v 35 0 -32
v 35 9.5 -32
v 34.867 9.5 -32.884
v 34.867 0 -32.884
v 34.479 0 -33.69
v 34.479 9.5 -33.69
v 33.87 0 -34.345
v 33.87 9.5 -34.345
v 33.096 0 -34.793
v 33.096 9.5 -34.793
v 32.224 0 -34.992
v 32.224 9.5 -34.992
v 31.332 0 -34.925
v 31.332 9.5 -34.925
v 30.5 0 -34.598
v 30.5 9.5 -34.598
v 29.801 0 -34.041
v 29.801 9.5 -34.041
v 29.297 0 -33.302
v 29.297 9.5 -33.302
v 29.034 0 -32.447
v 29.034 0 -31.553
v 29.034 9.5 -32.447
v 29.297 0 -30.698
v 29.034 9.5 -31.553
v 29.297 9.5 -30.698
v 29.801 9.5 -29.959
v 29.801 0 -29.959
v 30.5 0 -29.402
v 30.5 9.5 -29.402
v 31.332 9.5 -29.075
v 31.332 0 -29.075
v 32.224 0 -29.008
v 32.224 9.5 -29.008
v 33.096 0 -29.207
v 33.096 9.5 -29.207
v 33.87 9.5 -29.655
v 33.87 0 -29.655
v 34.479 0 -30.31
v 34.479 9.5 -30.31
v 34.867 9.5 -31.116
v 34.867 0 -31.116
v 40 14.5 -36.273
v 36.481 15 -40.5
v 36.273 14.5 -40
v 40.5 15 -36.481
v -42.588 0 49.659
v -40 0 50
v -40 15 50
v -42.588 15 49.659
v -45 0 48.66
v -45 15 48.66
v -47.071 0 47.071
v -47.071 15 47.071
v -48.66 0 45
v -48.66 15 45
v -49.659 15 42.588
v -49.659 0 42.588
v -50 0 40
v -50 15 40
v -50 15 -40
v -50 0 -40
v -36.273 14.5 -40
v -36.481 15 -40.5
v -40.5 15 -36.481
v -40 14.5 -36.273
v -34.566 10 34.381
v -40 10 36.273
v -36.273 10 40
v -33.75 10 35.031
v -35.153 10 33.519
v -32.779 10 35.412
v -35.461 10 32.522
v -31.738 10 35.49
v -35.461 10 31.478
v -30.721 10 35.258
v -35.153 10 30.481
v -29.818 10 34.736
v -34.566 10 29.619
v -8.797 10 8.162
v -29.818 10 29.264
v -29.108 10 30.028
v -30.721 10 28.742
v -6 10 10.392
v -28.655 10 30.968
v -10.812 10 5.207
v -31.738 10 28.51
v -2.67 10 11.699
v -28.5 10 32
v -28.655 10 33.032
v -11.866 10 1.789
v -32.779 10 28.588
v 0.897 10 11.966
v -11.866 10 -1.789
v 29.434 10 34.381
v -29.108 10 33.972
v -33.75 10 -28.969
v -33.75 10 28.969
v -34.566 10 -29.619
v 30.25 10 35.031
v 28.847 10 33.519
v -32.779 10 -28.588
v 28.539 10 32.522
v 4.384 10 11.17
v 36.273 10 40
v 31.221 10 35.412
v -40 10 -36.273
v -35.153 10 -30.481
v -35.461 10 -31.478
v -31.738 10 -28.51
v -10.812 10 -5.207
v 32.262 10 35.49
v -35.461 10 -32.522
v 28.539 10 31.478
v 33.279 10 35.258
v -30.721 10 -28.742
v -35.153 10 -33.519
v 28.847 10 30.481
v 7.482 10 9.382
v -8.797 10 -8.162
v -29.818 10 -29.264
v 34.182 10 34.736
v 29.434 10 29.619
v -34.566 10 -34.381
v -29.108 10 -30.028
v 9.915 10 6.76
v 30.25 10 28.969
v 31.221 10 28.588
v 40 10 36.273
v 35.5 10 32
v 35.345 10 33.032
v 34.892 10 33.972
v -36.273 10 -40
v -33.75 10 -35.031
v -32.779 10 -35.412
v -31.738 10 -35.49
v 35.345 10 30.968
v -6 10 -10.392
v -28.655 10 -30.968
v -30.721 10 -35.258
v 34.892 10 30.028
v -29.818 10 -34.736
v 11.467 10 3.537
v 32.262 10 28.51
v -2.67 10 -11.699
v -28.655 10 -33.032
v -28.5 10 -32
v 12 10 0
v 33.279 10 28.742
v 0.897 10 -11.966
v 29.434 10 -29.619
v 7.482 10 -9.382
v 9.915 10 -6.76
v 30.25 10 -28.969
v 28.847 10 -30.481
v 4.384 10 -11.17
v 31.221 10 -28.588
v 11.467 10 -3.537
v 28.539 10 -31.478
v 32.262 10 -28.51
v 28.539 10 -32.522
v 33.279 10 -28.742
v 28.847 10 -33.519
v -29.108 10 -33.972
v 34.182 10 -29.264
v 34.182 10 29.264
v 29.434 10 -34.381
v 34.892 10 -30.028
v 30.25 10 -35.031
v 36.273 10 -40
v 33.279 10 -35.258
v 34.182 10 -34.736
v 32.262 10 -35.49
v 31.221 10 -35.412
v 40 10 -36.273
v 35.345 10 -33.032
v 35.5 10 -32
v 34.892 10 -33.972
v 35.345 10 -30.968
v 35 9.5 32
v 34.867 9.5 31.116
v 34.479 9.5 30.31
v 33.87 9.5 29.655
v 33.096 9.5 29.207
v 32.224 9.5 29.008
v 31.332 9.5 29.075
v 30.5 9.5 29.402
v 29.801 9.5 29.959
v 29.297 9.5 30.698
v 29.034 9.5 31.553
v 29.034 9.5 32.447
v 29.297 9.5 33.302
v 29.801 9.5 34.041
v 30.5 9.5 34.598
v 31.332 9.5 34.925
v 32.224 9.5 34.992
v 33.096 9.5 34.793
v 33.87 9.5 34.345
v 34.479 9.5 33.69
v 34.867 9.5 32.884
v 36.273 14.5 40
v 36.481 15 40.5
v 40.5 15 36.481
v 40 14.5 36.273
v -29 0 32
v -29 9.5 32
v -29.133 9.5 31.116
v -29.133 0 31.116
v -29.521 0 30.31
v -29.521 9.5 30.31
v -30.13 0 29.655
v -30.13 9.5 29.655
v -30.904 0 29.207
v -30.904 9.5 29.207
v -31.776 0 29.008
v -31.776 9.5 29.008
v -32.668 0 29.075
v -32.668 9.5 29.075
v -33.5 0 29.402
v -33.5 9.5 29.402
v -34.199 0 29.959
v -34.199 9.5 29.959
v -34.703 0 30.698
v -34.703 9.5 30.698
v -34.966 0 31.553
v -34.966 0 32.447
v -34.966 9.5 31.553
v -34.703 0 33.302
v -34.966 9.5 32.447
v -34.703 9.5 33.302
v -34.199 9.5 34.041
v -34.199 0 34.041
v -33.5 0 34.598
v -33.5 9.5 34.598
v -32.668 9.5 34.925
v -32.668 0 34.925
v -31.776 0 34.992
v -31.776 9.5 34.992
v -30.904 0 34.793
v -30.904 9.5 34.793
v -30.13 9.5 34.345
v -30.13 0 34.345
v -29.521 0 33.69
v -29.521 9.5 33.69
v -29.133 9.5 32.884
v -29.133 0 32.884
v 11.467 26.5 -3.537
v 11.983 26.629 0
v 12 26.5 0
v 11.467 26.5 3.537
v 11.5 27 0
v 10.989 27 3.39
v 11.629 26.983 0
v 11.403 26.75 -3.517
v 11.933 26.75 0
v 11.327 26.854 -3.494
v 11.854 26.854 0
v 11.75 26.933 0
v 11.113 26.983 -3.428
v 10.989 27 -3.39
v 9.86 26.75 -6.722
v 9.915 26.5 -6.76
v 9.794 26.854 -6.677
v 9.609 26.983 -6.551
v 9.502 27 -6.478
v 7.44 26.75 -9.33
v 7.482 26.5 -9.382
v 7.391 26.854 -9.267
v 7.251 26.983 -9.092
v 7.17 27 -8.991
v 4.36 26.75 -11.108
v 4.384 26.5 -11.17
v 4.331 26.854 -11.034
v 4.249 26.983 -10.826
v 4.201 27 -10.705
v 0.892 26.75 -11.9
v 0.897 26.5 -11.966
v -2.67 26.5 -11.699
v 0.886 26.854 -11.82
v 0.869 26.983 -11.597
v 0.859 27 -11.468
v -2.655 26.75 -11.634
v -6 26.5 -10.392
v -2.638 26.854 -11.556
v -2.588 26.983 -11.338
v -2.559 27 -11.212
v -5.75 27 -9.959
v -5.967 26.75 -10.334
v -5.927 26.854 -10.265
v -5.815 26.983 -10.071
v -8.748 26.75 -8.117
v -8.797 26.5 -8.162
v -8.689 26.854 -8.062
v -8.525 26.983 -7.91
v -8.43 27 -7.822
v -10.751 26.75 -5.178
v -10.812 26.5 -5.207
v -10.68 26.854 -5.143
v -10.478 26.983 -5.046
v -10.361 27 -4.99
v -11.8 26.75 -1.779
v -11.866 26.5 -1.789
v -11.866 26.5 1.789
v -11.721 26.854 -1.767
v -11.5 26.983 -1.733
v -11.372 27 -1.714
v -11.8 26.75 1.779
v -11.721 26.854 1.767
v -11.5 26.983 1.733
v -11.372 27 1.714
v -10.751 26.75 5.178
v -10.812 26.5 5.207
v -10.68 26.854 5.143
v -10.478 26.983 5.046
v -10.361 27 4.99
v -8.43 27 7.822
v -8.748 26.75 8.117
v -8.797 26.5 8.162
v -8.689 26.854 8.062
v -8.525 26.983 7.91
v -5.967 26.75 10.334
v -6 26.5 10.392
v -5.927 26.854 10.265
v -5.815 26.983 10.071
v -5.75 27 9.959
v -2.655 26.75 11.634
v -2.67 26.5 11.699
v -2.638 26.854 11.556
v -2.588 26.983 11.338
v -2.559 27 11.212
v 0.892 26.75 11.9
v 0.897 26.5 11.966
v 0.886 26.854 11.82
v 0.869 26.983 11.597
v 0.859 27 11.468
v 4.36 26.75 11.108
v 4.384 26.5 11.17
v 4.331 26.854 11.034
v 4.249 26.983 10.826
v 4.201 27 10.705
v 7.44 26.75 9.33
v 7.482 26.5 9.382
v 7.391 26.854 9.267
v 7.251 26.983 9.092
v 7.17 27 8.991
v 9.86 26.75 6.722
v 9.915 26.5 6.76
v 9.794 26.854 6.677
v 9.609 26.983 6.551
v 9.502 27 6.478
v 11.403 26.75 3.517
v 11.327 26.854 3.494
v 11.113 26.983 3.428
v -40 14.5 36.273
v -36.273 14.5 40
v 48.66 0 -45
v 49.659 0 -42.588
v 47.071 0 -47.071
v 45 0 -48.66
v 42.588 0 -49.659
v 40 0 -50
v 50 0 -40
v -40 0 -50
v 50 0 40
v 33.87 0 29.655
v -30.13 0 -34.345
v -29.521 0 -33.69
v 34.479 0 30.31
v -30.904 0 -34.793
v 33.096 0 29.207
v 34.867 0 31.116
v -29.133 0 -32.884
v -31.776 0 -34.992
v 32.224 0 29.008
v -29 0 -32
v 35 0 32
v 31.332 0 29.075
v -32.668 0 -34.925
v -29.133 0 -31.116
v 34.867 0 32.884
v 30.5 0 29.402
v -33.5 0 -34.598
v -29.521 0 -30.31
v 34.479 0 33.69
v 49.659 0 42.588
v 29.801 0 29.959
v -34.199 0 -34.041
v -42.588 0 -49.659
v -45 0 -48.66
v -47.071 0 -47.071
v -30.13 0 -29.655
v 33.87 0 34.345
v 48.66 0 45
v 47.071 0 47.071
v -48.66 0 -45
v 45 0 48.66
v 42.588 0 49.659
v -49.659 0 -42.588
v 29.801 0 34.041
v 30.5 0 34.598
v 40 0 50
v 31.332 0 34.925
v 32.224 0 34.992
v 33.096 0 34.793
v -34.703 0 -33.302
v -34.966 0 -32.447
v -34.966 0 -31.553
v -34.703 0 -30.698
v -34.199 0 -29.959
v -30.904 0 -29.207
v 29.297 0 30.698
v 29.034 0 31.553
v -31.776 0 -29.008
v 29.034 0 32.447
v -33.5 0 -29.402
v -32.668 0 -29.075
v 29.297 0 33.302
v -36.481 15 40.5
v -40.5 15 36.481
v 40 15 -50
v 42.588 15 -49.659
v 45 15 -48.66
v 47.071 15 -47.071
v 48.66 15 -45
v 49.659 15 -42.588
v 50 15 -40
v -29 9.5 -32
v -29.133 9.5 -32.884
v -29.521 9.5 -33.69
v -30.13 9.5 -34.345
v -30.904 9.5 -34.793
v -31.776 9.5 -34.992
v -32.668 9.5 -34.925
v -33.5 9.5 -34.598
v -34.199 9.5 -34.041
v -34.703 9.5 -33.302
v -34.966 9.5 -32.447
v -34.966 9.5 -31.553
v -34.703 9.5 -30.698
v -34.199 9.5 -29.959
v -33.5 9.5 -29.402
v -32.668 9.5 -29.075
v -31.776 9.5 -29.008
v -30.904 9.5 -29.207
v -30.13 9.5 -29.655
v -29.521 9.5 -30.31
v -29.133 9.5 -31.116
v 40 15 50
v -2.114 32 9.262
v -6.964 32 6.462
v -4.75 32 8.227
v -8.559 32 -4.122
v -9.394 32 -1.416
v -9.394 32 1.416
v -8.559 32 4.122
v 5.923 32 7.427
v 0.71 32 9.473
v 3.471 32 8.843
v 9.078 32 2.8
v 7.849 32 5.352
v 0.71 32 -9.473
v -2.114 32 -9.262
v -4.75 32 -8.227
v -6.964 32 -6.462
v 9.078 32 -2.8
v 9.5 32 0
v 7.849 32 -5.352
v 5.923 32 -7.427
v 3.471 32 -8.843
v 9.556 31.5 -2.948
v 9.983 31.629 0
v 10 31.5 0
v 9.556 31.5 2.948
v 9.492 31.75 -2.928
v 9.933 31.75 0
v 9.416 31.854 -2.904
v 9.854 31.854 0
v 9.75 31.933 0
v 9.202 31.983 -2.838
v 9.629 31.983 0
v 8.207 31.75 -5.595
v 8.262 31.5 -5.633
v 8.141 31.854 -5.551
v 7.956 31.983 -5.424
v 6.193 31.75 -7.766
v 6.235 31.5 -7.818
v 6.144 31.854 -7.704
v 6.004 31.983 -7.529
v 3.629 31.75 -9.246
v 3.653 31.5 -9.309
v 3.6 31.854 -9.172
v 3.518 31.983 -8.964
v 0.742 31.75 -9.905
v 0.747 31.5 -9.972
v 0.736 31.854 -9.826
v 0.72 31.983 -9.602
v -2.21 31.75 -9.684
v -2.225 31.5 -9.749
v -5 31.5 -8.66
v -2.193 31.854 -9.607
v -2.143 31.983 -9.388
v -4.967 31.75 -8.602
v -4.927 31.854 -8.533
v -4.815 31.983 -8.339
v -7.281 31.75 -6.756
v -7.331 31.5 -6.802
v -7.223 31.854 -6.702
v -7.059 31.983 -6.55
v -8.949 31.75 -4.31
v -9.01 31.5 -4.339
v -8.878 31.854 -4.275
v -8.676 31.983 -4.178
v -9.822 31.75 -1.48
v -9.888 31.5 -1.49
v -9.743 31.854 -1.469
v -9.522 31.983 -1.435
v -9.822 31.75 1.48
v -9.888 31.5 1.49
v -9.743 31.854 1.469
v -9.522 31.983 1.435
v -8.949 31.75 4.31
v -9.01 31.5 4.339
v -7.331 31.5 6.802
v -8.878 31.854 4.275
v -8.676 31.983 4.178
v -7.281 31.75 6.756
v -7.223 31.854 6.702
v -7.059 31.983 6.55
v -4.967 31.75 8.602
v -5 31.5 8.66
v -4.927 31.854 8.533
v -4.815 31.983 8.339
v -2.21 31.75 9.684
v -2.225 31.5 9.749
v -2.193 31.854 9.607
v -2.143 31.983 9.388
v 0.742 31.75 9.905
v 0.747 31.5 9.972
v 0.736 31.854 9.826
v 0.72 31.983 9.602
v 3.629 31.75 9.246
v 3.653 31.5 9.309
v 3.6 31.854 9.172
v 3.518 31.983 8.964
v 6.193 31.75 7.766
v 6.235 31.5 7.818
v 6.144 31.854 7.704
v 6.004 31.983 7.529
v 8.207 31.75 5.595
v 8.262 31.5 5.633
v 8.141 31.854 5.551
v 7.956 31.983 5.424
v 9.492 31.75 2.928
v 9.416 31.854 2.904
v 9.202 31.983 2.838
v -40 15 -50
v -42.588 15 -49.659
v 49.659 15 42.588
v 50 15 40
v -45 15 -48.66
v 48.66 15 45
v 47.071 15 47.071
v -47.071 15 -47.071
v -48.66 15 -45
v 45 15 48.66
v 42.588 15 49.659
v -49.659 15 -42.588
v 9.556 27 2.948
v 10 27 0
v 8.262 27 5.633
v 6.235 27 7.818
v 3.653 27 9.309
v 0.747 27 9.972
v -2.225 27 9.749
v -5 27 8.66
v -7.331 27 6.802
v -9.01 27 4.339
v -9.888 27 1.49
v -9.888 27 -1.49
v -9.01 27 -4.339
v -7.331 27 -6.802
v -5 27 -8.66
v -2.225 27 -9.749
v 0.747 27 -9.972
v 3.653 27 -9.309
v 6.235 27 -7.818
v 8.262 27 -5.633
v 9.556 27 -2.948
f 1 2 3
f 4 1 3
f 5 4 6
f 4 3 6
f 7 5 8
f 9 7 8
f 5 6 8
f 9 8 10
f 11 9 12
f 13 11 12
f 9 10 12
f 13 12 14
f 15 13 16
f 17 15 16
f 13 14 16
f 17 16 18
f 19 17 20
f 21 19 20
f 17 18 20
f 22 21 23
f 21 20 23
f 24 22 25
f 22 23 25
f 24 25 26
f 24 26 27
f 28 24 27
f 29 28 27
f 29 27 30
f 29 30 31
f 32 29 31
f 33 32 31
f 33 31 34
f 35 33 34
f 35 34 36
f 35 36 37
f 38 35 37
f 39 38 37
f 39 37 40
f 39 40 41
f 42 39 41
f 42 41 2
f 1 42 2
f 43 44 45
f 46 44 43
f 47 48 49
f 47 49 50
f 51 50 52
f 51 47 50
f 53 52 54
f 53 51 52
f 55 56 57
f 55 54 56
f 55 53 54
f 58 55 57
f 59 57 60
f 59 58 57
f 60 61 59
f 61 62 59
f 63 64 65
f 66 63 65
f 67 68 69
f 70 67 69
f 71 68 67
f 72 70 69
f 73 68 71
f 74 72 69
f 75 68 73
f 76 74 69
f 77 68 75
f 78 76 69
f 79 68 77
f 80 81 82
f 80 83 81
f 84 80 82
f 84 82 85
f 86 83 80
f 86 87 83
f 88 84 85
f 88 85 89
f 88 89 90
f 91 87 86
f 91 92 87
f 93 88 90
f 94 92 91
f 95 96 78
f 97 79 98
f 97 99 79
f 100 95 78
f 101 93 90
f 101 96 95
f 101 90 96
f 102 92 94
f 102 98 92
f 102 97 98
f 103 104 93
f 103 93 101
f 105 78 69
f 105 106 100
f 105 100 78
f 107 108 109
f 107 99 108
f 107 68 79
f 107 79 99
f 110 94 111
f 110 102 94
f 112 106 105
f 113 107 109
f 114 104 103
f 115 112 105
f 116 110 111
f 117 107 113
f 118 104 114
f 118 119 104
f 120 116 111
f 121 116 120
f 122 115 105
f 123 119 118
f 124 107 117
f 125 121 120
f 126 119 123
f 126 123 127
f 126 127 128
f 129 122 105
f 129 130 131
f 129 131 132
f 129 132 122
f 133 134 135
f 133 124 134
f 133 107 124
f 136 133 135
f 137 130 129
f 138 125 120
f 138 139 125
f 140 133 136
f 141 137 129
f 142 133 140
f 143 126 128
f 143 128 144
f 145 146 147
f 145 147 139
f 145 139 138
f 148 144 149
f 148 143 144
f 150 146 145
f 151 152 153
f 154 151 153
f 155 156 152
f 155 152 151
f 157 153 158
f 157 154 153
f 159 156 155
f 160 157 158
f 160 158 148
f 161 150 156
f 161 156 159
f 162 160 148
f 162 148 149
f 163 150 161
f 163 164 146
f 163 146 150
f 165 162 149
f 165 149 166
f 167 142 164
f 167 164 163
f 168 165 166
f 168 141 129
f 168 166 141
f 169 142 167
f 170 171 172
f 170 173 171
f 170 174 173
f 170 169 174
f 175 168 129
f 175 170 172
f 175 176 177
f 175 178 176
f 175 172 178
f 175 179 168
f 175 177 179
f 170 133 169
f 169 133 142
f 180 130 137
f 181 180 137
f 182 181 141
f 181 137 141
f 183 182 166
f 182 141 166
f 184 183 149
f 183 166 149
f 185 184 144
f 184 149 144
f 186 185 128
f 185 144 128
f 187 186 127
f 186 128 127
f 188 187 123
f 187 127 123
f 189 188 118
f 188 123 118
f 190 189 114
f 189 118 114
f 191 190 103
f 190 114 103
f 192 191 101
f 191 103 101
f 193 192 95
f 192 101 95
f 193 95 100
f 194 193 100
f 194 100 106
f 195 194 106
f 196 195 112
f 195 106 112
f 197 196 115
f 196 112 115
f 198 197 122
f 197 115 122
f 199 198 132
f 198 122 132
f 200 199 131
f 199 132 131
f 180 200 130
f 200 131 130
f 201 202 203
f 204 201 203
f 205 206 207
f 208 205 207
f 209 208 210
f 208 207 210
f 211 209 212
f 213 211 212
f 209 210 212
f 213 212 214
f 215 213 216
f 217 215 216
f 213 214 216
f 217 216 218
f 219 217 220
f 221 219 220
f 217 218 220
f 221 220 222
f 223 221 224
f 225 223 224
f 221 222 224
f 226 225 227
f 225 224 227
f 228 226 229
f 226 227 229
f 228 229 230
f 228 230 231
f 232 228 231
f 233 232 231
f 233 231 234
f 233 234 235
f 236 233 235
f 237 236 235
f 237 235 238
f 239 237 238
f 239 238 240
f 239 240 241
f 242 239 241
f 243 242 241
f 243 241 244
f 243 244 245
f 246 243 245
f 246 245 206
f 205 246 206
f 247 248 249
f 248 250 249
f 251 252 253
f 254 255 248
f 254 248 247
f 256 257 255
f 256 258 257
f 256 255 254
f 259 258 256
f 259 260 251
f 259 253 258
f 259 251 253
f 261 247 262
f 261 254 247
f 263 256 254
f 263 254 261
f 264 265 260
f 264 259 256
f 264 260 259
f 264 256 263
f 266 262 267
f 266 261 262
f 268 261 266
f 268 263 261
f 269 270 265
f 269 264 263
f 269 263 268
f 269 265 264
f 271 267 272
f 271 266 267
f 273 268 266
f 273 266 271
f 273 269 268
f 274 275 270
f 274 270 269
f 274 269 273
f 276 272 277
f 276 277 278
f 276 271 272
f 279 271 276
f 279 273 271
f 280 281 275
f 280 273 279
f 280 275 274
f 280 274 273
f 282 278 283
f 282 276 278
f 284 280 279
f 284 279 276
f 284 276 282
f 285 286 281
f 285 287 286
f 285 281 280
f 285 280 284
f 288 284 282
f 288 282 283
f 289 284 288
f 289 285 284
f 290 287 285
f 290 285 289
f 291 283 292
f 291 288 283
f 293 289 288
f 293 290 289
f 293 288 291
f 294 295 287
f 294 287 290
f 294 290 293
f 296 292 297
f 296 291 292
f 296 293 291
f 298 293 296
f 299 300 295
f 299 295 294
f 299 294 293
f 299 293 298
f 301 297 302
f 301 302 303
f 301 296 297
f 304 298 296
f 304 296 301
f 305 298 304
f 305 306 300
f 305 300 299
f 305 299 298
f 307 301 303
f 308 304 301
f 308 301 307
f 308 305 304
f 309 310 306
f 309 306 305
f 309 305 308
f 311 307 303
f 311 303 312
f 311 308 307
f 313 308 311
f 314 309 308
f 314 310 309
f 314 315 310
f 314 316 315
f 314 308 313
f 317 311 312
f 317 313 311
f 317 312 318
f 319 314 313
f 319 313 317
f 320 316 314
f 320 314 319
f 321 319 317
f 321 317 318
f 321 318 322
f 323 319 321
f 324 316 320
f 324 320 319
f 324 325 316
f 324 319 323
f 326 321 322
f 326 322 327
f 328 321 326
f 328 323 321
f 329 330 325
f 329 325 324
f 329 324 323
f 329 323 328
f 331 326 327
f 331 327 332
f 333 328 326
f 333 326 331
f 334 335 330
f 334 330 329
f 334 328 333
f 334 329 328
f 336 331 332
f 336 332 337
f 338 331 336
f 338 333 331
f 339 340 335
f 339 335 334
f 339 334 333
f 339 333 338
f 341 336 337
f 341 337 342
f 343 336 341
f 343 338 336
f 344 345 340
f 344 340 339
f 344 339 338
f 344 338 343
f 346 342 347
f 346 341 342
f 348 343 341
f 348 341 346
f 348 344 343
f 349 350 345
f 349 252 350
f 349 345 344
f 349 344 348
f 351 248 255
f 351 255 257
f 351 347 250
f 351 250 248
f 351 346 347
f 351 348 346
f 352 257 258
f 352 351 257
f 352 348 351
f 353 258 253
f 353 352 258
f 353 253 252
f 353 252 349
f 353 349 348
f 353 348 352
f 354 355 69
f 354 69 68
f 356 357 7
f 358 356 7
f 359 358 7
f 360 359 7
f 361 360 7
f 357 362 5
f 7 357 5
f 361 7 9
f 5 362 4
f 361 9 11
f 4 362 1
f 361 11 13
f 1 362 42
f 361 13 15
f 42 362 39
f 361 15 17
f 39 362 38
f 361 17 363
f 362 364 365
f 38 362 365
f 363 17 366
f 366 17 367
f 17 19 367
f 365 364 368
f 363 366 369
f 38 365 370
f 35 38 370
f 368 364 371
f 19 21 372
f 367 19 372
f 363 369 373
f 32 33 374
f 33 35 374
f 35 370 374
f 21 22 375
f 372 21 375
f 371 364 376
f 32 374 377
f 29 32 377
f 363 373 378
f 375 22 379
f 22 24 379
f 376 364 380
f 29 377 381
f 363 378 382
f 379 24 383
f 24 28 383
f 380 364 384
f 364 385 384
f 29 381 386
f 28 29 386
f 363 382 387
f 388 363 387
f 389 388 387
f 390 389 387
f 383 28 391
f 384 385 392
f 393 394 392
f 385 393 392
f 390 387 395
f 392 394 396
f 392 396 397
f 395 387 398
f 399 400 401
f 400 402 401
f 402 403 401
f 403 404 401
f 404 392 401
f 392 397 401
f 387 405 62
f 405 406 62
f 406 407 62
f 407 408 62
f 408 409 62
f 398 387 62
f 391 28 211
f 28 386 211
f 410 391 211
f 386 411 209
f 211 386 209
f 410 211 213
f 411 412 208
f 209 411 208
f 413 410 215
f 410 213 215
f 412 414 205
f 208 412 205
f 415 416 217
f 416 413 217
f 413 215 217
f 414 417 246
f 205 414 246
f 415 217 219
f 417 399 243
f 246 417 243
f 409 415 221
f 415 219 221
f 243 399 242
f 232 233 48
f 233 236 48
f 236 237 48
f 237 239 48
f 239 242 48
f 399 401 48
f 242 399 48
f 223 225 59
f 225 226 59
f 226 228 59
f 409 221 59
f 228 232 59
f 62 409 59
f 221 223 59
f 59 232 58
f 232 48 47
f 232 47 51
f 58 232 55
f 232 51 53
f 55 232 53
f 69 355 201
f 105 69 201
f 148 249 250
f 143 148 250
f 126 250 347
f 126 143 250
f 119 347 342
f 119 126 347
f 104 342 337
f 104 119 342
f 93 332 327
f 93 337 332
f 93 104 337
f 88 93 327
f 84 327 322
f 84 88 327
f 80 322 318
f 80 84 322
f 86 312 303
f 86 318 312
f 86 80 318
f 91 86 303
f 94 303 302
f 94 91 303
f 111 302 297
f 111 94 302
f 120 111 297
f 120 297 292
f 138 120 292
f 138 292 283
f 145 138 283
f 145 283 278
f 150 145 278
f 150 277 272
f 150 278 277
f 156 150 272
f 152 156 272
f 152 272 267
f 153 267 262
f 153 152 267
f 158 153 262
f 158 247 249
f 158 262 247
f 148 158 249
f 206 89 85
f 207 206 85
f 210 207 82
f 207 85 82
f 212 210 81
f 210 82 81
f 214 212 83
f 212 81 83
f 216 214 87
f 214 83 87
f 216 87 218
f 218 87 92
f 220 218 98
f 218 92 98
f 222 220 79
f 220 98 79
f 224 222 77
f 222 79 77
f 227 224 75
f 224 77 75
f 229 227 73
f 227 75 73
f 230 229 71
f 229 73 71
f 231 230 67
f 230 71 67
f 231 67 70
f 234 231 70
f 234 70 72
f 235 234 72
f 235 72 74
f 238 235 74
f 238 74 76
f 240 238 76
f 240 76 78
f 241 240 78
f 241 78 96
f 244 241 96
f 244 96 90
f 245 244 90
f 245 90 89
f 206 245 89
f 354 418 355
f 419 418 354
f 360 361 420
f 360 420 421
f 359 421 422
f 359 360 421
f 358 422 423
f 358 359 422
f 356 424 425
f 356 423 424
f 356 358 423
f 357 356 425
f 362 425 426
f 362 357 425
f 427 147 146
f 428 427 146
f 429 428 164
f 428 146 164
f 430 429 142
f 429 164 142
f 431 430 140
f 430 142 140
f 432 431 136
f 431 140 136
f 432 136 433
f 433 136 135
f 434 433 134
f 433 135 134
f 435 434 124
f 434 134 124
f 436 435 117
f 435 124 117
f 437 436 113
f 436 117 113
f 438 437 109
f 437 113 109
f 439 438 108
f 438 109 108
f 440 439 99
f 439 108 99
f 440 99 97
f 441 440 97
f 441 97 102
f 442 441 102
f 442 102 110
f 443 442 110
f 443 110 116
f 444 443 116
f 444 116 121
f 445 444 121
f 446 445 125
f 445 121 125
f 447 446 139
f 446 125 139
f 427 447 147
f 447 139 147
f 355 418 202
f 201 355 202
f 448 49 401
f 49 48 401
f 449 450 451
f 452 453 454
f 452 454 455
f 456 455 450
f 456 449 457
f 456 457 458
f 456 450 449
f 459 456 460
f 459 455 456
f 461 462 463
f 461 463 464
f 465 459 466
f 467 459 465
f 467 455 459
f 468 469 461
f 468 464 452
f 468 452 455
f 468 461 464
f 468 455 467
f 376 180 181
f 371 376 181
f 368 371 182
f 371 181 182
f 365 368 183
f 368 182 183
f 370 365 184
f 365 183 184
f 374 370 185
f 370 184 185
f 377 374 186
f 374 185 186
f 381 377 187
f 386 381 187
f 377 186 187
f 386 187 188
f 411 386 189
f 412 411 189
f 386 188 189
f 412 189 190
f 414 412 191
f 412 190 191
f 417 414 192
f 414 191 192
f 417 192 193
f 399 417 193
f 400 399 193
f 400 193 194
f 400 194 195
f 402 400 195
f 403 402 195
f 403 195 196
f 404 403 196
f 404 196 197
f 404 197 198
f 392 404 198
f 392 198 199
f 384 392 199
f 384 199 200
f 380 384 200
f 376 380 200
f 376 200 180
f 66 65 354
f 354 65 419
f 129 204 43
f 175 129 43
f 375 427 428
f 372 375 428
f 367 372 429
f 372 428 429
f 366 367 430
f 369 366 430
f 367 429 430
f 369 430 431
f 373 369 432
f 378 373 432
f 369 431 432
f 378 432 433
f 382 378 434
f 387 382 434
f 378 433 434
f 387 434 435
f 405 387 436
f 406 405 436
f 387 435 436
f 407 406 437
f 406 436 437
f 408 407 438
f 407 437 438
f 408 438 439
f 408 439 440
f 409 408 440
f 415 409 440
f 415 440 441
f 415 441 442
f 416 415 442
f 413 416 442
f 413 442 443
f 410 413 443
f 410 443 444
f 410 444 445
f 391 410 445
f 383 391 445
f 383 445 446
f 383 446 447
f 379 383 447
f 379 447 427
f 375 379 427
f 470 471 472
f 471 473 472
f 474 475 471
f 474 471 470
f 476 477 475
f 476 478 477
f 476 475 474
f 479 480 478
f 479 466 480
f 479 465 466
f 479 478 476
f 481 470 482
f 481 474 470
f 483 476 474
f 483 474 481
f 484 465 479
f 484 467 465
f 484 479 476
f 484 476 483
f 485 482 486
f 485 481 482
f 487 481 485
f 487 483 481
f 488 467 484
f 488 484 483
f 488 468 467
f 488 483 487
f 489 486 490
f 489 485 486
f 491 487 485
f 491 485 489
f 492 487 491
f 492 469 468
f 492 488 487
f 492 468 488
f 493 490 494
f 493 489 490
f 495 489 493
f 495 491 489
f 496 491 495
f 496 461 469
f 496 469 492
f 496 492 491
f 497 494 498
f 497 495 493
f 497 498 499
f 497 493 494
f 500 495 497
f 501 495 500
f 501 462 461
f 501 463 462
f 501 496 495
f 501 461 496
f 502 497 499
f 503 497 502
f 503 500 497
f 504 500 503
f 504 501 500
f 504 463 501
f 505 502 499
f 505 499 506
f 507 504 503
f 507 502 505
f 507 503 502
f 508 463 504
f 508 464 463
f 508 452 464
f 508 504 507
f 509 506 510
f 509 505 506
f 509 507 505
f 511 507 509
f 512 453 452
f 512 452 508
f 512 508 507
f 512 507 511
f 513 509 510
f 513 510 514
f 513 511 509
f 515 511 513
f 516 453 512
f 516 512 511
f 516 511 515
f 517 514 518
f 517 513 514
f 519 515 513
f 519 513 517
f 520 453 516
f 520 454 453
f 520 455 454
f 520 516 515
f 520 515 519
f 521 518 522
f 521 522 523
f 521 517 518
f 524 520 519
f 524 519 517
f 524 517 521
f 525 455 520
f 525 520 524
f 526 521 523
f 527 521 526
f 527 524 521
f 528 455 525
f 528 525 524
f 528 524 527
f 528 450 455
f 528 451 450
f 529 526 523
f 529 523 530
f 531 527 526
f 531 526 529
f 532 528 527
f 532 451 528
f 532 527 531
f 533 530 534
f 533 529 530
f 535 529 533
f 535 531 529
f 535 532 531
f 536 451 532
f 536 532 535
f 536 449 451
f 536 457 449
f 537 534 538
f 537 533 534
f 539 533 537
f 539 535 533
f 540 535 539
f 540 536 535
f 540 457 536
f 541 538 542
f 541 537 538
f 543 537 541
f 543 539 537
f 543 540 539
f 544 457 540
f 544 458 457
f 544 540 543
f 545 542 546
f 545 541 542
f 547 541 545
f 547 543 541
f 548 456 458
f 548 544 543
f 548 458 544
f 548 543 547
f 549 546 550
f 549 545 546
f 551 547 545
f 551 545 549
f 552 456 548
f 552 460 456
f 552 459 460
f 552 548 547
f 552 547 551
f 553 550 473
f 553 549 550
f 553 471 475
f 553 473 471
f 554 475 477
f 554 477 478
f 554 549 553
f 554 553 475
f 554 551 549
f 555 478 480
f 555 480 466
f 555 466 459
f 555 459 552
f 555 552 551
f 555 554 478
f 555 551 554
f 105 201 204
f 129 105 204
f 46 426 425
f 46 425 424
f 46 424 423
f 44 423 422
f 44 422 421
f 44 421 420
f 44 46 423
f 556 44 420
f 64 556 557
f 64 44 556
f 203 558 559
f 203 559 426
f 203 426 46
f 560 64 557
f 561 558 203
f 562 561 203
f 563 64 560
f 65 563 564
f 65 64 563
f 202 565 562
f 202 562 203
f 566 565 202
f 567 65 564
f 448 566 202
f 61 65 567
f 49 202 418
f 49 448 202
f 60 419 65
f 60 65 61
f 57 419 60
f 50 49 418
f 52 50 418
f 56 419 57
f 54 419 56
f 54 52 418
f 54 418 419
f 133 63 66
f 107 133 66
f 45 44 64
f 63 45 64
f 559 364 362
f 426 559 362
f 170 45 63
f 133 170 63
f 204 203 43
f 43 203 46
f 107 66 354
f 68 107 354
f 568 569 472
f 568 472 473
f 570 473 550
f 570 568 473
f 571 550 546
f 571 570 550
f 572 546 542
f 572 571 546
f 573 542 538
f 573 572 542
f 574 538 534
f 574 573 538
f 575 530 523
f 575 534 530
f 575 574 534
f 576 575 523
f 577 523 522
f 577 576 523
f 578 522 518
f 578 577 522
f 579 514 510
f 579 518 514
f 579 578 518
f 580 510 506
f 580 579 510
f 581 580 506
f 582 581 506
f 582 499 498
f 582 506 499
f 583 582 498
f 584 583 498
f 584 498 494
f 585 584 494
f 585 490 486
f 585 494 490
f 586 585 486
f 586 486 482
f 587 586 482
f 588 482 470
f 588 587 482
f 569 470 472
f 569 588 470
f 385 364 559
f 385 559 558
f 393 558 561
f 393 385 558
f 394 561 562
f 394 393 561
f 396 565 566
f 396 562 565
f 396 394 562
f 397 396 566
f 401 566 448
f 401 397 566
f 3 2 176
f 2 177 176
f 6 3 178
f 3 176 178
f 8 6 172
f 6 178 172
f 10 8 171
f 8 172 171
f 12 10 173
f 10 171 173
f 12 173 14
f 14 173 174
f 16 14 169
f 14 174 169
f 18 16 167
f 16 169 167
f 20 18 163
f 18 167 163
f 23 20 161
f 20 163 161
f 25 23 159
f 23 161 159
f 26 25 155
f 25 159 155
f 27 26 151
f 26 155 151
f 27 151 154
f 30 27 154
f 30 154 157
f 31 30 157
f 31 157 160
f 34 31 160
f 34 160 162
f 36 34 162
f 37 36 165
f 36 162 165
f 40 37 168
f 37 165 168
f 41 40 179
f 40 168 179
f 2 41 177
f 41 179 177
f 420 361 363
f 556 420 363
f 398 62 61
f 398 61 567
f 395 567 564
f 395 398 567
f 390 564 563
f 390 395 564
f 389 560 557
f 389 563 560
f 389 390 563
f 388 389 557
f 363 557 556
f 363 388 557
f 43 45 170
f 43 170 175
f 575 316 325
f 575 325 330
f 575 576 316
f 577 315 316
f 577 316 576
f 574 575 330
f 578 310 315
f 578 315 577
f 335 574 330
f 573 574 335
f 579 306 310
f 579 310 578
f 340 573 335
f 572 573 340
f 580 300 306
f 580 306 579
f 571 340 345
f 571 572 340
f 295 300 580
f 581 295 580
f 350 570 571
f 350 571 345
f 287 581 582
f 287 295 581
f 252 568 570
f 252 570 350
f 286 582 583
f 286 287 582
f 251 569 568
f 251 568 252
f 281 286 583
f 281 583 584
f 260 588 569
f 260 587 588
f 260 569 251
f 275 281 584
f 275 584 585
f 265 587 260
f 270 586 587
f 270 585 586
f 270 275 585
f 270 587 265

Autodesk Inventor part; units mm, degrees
ref_plane "YZ Plane" through (0, 0, 0) normal (1, 0, 0) x (0, 1, 0)
ref_plane "XZ Plane" through (0, 0, 0) normal (0, 1, 0) x (-1, 0, 0)
ref_plane "XY Plane" through (0, 0, 0) normal (0, 0, 1) x (1, 0, 0)
sketch "Sketch1" plane through (0, 0, 0) normal (0, 1, 0) x (-1, 0, 0)
  line L0 (40, 50) -> (-40, 50)
  line L1 (-50, 40) -> (-50, -40)
  line L2 (-40, -50) -> (40, -50)
  line L3 (50, -40) -> (50, 40)
  line L4 (50, 50) -> (-50, -50) construction
  line L5 (-50, 50) -> (50, -50) construction
  arc A0 (-40, 50) -> (-50, 40) centre (-40, 40) ccw
  arc A1 (50, 40) -> (40, 50) centre (40, 40) ccw
  arc A2 (-50, -40) -> (-40, -50) centre (-40, -40) ccw
  arc A3 (40, -50) -> (50, -40) centre (40, -40) ccw
  point P0 (0, 0)
  dimension "d0" = 100
  dimension "d1" = 100
  dimension "d2" = 10
  dimension "d3" = 10
  dimension "d4" = 10
extrude "Extrusion1" add sketch "Sketch1" along normal blind 15
sketch "Sketch2" plane through (0, 15, 0) normal (0, 1, 0) x (1, 0, 0)
  line L0 (-36.2734, -40) -> (36.2734, -40)
  line L1 (40, -36.2734) -> (40, 36.2734)
  line L2 (36.2734, 40) -> (-36.2734, 40)
  line L3 (-40, 36.2734) -> (-40, -36.2734)
  line L4 (-40, -40) -> (40, 40) construction
  line L5 (40, -40) -> (-40, 40) construction
  line L6 (-36.2734, -40) -> (-40, -36.2734)
  line L7 (-36.2734, 40) -> (-40, 36.2734)
  line L8 (36.2734, -40) -> (40, -36.2734)
  line L9 (36.2734, 40) -> (40, 36.2734)
  point P0 (0, 0)
  dimension "d7" = 80
  dimension "d8" = 80
  dimension "d9" = 3.7266
  dimension "d10" = 3.7266
  dimension "d11" = 3.7266
  dimension "d12" = 3.7266
  dimension "d13" = 3.7266
  dimension "d14" = 3.7266
  dimension "d15" = 3.7266
  dimension "d16" = 3.7266
extrude "Extrusion2" cut sketch "Sketch2" against normal blind 5
sketch "Sketch3" plane through (0, 10, 0) normal (0, 1, 0) x (1, 0, 0)
  line L0 (0, 0) -> (32, 0)
  line L1 (32, 0) -> (32, -32)
  circle A0 centre (32, -32) radius 3
  circle A1 centre (32, 32) radius 3
  circle A2 centre (-32, 32) radius 3
  circle A3 centre (-32, -32) radius 3
  dimension "d19" = 32
  dimension "d20" = 32
  dimension "d21" = 6
  dimension "d24" = 360
  dimension "d44" = 6
extrude "Extrusion3" cut sketch "Sketch3" against normal blind 20
sketch "Sketch4" plane through (0, 10, 0) normal (0, 1, 0) x (1, 0, 0)
  circle A0 centre (0, 0) radius 12
  dimension "d28" = 24
extrude "Extrusion4" add sketch "Sketch4" along normal blind 17
sketch "Sketch5" plane through (0, 27, 0) normal (0, 1, 0) x (1, 0, 0)
  circle A0 centre (0, 0) radius 10
  dimension "d31" = 20
extrude "Extrusion5" add sketch "Sketch5" along normal blind 5
fillet "Fillet1" radius 0.5 2 edges at (-12, 27, 0) (-10, 32, 0)
chamfer "Chamfer1" distance 0.5 angle 45 12 edges at (-35, 10, 32) (29, 10, 32) (29, 10, -32) (-35, 10, -32) (0, 15, 40) (-38.1367, 15, 38.1367) (-40, 15, 0) (-38.1367, 15, -38.1367) (0, 15, -40) (38.1367, 15, -38.1367) (40, 15, 0) (38.1367, 15, 38.1367)
equation "\"d0\" = d1"
equation "\"d8\" = d7"
equation "\"d10\" = d9"
equation "\"d11\" = d9"
equation "\"d12\" = d9"
equation "\"d13\" = d9"
equation "\"d14\" = d9"
equation "\"d15\" = d9"
equation "\"d16\" = d9"
properties part number "Base1"
